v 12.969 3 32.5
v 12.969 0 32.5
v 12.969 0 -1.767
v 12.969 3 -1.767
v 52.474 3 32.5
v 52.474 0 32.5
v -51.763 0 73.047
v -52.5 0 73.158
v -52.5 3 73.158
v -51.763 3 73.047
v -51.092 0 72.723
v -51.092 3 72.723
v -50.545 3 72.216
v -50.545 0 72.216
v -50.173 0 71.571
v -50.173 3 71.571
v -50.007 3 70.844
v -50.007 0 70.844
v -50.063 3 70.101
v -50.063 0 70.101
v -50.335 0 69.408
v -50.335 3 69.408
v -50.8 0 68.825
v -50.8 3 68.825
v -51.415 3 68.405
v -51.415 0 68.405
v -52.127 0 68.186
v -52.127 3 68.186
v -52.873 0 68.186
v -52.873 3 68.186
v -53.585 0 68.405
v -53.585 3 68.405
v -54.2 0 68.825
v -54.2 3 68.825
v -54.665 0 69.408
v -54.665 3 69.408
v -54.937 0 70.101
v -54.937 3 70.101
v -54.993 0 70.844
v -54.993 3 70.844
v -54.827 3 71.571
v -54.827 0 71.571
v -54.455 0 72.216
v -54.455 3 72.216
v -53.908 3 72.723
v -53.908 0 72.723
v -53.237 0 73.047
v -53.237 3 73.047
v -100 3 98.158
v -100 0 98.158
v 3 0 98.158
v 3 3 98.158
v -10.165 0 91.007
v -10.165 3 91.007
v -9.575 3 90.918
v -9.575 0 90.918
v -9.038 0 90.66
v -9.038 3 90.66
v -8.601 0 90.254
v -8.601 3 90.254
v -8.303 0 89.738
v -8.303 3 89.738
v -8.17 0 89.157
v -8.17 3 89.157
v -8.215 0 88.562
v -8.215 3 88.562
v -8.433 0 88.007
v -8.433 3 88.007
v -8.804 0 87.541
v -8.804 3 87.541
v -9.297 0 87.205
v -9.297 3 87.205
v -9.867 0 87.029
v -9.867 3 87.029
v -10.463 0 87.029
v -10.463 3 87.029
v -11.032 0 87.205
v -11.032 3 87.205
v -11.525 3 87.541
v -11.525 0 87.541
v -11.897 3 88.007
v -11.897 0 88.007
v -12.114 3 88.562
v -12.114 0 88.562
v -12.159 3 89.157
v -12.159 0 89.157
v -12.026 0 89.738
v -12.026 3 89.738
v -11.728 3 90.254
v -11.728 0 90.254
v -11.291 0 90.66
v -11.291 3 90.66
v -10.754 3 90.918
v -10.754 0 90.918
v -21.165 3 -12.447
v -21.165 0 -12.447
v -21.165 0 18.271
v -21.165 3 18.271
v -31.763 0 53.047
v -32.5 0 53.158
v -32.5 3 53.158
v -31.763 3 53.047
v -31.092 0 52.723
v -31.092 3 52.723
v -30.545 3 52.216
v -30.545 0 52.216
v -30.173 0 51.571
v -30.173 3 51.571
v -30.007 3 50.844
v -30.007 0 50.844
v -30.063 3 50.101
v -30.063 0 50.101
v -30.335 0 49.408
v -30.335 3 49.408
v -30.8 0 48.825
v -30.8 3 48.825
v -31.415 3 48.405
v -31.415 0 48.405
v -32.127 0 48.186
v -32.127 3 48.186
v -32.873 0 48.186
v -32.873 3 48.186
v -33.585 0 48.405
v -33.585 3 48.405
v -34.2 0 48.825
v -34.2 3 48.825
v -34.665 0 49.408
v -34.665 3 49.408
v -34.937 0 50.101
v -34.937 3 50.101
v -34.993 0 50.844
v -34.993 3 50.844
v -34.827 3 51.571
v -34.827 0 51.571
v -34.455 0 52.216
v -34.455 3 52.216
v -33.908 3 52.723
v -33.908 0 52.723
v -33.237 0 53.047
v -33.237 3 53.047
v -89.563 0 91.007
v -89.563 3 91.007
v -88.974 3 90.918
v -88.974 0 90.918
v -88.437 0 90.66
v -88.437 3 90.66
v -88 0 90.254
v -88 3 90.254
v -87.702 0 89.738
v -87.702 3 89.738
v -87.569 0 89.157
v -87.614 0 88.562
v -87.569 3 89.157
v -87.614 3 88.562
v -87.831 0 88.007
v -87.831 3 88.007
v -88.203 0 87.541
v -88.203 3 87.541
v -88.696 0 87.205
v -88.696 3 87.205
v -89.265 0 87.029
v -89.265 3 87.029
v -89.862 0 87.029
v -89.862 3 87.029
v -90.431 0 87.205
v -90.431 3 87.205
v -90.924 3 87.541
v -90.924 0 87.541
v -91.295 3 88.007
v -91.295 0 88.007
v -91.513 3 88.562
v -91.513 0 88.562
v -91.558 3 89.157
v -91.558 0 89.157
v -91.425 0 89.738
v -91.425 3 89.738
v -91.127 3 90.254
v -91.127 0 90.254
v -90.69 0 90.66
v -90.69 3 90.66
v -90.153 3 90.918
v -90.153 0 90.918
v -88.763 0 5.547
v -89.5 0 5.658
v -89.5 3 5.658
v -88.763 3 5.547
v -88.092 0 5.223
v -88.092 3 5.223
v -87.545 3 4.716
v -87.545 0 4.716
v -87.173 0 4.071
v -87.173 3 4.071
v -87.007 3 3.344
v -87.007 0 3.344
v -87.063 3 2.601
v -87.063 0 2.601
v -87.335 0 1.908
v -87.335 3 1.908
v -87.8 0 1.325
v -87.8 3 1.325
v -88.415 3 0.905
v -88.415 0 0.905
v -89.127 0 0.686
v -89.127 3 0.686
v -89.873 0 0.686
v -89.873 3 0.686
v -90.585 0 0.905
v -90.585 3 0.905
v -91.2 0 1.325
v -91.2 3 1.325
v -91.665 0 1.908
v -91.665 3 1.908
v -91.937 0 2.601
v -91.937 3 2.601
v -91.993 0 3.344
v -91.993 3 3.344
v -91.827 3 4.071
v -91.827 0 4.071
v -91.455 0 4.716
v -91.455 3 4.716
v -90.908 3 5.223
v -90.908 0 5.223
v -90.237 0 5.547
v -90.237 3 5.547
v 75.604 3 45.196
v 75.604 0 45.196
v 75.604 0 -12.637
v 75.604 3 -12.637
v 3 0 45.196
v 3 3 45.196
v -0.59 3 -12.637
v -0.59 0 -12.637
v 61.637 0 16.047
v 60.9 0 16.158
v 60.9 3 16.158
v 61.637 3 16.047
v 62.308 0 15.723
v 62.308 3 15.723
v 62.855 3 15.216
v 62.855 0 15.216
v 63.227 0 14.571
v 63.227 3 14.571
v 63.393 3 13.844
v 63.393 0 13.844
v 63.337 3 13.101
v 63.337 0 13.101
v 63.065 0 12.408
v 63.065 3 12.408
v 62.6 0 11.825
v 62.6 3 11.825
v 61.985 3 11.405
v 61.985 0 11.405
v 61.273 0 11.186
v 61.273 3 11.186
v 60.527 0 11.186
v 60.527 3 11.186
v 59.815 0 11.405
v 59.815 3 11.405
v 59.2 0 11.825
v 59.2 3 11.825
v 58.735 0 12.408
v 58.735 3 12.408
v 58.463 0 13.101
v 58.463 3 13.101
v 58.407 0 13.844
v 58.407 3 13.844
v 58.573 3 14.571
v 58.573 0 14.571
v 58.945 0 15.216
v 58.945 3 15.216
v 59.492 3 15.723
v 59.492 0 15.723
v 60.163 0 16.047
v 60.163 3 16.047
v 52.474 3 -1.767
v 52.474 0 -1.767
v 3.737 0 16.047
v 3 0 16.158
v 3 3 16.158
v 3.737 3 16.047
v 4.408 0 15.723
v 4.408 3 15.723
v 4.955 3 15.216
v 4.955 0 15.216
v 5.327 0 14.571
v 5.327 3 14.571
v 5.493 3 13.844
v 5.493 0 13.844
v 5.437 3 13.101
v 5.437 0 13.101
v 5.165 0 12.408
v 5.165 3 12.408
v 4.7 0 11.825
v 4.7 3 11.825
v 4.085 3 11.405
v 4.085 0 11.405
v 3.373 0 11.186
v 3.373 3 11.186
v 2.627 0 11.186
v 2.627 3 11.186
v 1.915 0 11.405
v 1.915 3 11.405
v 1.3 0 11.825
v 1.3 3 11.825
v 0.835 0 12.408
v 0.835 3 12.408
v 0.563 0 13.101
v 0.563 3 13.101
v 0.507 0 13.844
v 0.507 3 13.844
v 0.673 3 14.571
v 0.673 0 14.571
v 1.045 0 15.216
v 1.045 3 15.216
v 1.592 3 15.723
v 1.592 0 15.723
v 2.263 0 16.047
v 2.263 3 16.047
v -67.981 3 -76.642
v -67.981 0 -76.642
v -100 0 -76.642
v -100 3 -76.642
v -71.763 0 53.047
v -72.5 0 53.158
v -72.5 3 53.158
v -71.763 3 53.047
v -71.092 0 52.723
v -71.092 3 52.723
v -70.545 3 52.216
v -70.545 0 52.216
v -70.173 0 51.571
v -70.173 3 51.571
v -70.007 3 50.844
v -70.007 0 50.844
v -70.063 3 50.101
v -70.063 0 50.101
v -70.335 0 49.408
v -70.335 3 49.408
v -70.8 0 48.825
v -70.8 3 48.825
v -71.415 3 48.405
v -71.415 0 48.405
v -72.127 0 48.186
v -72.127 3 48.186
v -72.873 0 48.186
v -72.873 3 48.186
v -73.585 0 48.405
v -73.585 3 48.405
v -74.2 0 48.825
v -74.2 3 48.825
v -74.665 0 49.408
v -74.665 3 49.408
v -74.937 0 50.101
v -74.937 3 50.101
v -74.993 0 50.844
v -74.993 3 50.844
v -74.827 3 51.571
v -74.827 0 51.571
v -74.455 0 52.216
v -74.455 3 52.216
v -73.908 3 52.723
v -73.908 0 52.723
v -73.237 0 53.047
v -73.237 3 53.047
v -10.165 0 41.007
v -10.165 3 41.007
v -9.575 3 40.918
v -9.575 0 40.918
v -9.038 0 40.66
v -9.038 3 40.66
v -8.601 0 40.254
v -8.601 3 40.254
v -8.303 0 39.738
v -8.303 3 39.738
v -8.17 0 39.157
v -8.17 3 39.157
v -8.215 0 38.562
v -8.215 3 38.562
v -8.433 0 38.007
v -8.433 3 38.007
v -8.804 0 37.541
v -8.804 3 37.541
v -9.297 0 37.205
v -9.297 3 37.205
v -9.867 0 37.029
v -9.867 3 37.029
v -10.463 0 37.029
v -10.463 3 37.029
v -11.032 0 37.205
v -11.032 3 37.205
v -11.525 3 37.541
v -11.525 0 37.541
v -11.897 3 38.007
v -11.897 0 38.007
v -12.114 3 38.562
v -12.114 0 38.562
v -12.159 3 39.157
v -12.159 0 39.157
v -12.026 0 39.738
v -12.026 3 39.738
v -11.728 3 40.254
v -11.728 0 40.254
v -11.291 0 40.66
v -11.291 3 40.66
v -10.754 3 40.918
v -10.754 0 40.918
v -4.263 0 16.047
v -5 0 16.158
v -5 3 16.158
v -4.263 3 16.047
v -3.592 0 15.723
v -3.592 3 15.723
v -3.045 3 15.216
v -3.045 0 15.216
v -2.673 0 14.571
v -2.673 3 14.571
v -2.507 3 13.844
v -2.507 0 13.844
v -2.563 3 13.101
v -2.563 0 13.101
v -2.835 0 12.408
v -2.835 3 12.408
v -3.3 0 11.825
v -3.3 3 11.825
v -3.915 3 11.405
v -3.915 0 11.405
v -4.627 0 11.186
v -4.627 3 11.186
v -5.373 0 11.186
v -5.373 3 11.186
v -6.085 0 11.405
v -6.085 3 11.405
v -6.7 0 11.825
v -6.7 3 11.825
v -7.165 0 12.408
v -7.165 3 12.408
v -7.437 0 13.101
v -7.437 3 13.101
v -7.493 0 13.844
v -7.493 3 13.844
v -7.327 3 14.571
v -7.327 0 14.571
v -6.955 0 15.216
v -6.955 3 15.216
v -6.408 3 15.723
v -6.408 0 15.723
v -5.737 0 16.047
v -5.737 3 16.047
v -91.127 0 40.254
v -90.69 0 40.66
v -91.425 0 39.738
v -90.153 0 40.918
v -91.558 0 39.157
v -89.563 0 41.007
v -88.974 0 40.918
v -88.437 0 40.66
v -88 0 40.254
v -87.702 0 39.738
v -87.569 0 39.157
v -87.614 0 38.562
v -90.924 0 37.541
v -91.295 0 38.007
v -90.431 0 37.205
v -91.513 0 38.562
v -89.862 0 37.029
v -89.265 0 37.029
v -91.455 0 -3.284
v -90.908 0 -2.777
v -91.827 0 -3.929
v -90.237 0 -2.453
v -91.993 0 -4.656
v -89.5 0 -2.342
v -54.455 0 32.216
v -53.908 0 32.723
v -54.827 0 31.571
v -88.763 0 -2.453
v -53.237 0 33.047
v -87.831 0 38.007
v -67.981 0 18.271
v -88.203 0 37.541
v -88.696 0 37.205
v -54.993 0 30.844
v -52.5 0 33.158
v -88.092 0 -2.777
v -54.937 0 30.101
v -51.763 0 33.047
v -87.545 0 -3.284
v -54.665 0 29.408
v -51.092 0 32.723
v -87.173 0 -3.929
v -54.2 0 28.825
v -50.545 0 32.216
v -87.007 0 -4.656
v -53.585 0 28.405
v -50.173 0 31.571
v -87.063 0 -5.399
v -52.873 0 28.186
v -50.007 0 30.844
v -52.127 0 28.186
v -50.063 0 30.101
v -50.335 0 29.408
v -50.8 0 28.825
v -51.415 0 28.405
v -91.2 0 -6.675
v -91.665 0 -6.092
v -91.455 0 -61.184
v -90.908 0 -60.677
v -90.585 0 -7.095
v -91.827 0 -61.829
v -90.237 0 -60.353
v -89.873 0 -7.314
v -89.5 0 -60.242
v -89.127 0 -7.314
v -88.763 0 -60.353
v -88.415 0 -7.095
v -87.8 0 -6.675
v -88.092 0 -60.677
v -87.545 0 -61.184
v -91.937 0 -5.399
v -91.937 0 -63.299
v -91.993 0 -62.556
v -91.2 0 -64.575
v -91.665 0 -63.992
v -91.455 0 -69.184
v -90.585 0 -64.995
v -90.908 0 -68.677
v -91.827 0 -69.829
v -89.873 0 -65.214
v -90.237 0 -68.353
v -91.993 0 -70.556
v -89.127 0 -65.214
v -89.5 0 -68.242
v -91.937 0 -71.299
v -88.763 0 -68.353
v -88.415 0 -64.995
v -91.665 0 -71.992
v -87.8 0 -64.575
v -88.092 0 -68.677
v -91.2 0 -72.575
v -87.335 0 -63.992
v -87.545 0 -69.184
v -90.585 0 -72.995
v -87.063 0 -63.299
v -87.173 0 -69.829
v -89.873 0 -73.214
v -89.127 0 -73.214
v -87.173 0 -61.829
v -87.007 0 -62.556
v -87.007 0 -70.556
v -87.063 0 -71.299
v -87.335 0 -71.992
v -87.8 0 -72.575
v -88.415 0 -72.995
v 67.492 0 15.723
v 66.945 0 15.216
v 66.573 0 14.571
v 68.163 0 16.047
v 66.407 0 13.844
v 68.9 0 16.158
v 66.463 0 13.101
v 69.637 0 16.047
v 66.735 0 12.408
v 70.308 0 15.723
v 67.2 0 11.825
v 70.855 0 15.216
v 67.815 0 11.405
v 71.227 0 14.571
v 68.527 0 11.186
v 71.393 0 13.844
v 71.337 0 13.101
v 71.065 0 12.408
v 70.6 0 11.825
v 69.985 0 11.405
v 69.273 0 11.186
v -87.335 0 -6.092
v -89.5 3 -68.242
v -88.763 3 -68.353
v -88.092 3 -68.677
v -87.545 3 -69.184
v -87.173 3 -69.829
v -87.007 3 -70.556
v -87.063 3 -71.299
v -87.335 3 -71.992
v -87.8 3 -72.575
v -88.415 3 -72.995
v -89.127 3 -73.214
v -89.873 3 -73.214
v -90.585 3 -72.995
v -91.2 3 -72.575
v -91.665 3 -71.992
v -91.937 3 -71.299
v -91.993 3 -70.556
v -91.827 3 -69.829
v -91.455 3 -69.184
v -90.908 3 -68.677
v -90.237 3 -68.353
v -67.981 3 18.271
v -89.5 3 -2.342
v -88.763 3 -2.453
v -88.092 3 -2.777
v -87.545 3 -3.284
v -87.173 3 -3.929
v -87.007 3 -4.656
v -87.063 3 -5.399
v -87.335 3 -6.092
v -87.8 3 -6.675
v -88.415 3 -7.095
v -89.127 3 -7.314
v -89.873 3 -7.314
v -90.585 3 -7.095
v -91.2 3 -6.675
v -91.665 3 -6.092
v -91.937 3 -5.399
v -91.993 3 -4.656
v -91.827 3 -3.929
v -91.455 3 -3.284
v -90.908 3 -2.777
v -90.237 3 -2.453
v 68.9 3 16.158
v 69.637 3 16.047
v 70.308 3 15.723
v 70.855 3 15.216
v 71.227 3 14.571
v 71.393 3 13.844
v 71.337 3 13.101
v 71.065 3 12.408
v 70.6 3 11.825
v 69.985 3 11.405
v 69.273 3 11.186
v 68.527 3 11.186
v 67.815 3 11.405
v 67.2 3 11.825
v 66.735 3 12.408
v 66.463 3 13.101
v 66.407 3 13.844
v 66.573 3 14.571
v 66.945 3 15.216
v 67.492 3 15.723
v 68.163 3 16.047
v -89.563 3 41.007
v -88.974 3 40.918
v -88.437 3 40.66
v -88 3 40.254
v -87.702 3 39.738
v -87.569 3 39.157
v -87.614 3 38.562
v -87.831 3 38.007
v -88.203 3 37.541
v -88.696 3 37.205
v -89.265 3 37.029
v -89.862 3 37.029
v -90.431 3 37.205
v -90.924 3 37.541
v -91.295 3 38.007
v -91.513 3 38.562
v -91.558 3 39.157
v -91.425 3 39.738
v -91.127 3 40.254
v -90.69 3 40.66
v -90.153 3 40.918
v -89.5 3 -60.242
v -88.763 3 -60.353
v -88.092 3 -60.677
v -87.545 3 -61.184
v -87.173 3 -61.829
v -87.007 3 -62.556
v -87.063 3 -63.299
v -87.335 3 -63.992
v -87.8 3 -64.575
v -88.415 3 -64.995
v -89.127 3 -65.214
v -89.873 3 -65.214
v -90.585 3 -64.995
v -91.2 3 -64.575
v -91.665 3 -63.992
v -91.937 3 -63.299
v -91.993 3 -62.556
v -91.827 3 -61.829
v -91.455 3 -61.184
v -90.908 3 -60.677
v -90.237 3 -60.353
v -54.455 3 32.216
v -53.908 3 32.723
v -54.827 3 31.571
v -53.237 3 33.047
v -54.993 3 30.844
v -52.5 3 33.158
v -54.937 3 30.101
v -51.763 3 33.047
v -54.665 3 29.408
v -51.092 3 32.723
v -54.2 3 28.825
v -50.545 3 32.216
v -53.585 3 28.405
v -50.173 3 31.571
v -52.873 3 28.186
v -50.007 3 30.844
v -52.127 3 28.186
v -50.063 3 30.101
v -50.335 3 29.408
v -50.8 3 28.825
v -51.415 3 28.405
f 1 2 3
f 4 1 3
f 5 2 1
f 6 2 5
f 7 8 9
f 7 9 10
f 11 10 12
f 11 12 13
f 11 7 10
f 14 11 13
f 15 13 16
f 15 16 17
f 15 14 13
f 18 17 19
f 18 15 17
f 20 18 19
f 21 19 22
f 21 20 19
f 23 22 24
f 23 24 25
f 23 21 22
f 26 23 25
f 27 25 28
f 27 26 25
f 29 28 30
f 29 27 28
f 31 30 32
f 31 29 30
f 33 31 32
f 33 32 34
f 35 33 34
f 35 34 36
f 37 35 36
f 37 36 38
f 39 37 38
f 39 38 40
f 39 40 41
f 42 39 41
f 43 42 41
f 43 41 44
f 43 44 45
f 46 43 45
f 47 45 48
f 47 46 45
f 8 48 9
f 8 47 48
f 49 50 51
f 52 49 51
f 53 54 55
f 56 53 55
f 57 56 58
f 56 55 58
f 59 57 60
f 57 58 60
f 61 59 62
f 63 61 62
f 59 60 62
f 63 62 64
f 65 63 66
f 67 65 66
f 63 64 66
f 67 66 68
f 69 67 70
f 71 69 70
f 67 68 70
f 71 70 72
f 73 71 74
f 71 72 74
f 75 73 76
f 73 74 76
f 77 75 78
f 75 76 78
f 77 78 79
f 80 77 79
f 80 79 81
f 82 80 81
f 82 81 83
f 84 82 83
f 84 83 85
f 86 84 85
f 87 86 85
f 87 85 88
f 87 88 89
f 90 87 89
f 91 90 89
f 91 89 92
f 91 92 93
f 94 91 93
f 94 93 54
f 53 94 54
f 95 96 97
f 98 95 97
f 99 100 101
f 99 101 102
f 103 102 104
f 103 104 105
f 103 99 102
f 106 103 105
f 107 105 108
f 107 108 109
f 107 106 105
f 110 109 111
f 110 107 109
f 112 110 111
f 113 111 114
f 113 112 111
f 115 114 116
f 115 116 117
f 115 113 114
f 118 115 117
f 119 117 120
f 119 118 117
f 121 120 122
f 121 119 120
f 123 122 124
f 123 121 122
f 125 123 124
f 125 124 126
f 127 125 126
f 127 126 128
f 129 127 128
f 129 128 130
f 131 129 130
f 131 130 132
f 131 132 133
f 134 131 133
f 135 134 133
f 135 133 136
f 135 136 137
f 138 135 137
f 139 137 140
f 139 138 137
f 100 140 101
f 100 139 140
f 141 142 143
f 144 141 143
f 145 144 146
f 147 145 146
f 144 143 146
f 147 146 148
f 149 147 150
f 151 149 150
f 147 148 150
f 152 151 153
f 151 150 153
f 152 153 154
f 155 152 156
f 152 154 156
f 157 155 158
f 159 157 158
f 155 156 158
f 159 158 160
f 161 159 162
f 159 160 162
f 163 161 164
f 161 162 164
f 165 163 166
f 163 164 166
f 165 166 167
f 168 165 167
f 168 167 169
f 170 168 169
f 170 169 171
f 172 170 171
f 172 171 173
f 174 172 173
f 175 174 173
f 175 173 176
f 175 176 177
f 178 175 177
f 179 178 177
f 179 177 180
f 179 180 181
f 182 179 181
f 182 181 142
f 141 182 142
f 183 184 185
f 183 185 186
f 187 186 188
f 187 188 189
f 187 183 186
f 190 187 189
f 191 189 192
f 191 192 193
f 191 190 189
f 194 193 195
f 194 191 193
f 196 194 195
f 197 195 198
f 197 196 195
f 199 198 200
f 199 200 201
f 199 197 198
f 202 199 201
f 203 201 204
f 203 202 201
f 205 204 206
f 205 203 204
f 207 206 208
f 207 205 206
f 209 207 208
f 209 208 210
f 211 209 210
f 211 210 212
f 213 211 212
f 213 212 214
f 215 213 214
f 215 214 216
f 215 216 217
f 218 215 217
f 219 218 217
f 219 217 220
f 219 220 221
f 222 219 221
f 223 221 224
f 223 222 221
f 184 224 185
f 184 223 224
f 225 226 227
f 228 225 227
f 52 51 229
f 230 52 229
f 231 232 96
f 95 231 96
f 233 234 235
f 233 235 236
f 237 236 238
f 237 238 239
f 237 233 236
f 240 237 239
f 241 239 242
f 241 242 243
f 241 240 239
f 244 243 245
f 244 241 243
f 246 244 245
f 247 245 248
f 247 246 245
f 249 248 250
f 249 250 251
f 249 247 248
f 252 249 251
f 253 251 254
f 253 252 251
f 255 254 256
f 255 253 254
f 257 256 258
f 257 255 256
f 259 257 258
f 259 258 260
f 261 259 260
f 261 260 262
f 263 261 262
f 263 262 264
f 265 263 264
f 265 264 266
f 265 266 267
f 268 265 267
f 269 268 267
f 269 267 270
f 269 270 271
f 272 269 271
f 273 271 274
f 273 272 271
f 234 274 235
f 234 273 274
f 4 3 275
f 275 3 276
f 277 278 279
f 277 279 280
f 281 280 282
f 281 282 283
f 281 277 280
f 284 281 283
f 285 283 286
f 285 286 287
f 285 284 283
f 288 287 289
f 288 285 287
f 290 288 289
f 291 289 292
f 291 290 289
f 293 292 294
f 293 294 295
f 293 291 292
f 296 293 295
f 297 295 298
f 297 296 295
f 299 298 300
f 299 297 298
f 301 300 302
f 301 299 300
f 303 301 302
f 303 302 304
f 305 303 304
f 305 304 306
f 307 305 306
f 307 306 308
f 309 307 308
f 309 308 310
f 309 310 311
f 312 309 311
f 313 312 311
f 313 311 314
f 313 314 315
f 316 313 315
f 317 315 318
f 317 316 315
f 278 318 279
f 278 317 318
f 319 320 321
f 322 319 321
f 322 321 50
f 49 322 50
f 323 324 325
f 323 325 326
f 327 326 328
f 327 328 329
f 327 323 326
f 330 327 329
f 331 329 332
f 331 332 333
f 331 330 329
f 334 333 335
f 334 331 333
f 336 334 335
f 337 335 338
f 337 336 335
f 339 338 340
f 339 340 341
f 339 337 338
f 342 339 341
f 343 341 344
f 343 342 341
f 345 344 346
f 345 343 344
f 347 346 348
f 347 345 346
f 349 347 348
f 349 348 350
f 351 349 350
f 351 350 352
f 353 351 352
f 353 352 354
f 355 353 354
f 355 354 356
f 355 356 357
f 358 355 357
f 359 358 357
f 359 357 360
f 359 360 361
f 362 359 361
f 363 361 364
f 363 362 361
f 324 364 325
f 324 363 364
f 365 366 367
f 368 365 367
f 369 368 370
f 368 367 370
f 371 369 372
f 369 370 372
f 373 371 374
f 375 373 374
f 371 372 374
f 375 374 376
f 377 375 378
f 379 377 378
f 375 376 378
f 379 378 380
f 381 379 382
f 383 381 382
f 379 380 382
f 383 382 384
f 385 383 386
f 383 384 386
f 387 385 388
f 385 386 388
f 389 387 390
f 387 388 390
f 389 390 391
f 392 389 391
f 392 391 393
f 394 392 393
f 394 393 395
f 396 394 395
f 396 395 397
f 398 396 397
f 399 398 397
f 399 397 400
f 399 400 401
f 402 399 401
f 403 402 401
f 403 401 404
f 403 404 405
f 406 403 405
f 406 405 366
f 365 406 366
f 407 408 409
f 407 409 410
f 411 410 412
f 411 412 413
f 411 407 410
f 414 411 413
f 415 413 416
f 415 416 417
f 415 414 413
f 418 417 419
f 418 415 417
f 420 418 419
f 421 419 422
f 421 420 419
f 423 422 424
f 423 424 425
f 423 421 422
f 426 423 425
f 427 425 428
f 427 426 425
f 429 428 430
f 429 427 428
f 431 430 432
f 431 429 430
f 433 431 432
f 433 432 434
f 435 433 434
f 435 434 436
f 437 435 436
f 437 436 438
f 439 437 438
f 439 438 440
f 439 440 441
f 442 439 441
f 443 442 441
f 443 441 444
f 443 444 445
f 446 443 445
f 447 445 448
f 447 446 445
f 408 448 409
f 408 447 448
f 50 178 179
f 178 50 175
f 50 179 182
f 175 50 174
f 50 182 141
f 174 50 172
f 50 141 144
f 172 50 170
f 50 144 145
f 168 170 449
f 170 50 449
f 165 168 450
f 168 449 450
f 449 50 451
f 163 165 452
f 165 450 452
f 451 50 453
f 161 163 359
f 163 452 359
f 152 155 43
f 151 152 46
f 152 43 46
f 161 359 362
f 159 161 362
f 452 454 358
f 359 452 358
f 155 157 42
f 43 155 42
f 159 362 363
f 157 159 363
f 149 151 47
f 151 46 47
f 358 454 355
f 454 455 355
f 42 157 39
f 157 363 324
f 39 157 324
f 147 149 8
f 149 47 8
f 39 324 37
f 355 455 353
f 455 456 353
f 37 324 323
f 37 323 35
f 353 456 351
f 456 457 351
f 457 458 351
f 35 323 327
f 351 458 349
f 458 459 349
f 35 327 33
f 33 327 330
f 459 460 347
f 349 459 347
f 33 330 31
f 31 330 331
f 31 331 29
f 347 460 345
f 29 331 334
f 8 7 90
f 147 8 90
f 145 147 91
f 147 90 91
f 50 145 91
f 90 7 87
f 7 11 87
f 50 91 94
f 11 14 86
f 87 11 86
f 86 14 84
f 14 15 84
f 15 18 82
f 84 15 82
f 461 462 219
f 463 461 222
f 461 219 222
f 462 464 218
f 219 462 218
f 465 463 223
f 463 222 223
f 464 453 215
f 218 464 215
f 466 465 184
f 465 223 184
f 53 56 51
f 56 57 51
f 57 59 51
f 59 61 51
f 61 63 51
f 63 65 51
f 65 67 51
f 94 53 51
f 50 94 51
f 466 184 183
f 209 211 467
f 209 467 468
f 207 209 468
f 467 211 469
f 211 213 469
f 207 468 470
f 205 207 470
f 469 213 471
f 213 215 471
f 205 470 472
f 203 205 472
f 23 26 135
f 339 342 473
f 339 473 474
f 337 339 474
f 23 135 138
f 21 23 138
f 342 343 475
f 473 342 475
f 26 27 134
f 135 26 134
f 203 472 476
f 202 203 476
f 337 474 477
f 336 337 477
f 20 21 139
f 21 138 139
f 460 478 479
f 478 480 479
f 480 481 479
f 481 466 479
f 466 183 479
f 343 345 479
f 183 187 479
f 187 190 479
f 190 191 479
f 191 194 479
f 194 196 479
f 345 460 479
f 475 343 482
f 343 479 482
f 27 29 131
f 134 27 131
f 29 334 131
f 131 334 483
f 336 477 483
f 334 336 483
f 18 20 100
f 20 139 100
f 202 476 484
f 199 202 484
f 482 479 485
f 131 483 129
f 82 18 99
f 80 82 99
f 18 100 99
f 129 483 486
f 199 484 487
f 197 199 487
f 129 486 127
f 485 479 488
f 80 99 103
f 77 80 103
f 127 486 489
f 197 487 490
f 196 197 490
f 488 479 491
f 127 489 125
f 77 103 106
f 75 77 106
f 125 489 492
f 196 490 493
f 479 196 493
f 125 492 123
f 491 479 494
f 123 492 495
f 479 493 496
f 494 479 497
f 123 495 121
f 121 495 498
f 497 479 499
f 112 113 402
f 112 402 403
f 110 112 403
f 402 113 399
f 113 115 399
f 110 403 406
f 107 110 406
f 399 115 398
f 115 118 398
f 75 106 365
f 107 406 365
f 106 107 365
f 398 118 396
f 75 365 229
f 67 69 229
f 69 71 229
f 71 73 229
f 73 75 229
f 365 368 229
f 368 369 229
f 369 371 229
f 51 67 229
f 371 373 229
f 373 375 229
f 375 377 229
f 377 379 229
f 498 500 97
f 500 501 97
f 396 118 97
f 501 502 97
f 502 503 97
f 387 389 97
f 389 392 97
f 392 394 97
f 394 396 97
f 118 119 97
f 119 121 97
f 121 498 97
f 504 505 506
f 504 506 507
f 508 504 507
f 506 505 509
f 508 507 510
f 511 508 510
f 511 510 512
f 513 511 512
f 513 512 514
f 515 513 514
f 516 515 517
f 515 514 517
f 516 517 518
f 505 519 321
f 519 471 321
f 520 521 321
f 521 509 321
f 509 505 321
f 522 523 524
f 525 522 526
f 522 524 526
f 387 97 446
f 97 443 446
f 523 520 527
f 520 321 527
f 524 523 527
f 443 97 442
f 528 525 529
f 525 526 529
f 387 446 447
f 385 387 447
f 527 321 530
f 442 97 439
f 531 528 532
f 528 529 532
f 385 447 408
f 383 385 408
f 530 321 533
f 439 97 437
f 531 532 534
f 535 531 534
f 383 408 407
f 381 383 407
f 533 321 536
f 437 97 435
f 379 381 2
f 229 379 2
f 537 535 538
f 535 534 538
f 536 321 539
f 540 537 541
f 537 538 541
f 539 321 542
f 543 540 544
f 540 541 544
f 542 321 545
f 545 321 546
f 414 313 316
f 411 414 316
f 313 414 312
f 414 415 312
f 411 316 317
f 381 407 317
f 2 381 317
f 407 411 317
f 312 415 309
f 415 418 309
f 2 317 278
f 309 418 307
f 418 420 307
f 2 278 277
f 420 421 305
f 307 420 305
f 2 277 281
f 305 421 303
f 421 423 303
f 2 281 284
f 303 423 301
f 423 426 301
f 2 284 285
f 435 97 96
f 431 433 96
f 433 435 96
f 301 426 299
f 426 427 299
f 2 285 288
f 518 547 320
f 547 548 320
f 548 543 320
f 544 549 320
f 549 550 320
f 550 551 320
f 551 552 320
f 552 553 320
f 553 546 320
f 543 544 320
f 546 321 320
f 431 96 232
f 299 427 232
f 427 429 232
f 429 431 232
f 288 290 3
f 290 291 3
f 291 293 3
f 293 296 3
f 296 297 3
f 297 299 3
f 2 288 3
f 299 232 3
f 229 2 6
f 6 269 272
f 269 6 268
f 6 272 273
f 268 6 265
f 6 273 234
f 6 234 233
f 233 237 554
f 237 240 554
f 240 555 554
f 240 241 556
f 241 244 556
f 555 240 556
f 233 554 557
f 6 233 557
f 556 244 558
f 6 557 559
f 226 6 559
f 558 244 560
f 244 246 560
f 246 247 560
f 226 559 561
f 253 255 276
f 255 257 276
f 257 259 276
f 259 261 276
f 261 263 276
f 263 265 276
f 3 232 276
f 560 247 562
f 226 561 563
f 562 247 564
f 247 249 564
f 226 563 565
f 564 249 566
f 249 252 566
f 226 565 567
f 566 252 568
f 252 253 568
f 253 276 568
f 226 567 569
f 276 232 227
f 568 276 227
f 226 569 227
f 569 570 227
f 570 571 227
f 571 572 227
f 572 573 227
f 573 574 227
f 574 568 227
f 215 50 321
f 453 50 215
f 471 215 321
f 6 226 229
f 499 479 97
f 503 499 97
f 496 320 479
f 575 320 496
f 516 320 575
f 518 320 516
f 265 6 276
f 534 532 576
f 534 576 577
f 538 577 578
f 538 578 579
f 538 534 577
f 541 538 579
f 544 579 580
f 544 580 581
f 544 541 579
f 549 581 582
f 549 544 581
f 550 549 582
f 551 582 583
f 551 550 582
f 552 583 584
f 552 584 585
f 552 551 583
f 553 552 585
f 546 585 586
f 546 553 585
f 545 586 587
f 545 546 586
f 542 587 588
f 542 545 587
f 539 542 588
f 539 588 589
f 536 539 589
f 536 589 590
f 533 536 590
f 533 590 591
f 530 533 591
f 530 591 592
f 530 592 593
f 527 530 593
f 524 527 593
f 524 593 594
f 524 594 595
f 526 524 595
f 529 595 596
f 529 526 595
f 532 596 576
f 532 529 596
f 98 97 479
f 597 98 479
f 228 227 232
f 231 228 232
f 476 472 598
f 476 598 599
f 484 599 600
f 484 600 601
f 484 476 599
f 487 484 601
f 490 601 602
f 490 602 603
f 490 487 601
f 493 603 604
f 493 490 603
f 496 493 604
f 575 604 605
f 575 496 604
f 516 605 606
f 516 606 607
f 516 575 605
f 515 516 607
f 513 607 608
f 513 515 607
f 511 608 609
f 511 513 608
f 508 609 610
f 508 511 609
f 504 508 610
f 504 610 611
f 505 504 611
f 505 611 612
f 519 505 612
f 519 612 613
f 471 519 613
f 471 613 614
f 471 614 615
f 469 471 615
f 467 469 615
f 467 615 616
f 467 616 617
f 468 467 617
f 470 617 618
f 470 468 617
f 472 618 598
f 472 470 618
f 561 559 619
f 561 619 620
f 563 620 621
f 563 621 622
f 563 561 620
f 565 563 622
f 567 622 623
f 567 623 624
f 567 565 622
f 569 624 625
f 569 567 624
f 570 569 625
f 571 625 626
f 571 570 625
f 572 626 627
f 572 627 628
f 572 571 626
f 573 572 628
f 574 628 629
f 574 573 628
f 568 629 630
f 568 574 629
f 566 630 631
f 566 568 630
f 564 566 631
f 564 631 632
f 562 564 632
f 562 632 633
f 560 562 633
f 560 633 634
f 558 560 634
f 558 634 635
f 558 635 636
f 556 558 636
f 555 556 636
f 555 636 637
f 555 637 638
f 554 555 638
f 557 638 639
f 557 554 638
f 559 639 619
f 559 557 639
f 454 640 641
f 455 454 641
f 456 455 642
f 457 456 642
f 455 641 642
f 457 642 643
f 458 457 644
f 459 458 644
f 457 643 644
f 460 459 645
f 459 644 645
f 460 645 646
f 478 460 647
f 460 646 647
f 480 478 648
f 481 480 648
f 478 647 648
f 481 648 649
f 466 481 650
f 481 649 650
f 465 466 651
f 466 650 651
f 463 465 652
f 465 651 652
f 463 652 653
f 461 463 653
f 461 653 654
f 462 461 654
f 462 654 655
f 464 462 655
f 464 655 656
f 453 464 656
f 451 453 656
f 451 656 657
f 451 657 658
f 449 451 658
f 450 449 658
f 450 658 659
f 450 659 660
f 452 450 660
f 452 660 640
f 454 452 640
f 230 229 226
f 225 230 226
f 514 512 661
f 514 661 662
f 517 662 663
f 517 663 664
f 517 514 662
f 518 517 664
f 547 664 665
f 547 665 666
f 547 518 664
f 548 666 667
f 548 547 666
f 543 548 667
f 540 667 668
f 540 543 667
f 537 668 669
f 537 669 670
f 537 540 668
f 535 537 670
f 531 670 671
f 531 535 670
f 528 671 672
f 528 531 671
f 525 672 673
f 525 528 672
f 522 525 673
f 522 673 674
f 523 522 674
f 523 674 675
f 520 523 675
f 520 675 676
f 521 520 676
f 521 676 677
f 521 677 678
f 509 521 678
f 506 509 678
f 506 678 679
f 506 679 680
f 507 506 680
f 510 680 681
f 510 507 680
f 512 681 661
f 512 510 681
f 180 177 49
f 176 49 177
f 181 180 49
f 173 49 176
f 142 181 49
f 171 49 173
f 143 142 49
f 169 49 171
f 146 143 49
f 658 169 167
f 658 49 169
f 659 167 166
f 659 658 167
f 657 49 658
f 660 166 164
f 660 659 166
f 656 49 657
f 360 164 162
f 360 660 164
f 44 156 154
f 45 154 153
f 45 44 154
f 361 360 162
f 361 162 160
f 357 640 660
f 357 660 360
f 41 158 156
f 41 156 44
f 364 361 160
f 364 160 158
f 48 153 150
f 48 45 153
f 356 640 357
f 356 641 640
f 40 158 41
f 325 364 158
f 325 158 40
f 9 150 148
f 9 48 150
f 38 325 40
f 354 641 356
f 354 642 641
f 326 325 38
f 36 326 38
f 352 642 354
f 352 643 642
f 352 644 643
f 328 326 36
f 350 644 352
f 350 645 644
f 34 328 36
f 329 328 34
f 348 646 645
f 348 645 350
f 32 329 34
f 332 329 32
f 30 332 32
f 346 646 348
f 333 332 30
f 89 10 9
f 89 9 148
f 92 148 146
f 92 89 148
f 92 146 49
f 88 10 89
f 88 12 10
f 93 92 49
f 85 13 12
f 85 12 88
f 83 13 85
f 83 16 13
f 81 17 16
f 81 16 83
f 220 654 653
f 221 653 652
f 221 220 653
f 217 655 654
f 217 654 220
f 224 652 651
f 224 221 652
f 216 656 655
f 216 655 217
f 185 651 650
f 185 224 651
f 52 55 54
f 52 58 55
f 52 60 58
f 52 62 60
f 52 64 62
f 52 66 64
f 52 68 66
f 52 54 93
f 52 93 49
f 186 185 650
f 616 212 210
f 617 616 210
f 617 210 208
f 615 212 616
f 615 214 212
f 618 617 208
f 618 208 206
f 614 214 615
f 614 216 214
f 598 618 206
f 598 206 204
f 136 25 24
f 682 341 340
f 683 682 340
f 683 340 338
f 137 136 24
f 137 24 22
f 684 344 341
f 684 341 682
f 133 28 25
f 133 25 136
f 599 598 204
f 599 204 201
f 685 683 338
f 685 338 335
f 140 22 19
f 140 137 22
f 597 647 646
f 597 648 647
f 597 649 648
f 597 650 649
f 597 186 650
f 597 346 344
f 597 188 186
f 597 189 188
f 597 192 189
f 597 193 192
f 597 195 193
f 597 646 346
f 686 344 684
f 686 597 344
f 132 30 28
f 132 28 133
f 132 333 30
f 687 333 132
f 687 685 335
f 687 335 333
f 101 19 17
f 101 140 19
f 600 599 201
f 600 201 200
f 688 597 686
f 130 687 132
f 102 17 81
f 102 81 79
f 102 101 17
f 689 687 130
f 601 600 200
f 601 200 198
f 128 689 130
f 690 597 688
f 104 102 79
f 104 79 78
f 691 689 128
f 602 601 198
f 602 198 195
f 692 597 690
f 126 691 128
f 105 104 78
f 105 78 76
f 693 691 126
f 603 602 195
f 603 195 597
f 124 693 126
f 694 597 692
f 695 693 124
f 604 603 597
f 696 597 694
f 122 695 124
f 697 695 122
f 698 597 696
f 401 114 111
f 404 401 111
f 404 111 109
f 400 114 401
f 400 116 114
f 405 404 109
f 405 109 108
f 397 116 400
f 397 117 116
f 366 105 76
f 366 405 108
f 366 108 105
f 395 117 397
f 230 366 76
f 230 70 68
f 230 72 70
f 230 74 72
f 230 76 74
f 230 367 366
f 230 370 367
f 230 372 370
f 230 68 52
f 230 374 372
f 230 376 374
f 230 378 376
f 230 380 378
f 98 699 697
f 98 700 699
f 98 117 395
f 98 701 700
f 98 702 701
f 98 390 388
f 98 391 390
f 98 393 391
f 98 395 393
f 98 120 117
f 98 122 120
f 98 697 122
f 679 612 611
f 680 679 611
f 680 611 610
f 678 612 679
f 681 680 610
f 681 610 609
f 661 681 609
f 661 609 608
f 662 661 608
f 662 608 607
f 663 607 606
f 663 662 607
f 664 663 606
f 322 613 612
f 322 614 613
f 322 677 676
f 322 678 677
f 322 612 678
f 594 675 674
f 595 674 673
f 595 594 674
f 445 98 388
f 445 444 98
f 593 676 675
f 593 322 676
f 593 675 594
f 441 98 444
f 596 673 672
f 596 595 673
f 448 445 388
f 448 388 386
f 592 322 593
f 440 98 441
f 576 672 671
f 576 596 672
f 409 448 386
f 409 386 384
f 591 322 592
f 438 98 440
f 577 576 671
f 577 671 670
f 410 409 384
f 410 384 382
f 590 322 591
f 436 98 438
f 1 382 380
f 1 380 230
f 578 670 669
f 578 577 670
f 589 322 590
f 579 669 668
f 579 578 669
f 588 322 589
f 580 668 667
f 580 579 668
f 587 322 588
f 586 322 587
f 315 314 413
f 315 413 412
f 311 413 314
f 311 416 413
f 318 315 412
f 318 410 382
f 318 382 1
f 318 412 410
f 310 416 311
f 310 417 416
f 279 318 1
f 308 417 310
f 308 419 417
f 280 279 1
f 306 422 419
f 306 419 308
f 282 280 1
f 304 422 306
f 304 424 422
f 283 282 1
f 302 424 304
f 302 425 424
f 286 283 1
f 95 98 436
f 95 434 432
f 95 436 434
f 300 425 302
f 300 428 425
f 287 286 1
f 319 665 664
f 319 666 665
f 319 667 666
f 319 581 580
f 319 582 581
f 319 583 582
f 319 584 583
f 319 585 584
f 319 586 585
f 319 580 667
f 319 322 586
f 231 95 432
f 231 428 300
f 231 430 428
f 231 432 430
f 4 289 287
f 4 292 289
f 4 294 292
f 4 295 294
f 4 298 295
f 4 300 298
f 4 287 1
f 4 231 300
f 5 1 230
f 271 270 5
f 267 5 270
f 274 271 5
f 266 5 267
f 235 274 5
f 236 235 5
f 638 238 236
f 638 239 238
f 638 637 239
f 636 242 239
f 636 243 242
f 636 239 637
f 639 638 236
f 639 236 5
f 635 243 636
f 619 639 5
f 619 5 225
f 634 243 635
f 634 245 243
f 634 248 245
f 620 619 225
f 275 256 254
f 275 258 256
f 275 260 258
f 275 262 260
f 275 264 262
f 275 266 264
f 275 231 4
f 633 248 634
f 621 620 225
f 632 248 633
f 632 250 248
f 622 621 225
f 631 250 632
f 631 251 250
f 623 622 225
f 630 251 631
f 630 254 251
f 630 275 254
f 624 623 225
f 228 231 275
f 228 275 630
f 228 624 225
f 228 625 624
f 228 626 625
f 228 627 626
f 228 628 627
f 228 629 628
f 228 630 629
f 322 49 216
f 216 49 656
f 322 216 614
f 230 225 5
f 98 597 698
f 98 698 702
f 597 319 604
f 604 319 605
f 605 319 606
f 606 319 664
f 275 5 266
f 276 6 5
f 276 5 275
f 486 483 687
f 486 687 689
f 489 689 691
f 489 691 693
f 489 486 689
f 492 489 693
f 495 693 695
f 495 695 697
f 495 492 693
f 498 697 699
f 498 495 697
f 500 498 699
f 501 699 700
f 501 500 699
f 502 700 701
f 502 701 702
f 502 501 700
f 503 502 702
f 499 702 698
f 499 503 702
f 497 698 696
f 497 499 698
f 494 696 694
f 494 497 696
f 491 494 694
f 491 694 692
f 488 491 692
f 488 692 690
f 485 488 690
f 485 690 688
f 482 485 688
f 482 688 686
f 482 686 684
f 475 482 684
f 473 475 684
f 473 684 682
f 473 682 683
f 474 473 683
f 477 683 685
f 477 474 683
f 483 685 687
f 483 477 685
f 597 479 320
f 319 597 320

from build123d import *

# Parameters (mm, degrees)
SKETCH1_R           = 2.5
SKETCH1_W           = 39.504270757
SKETCH1_H           = 34.26660973
BOSS_EXTRUDE1_DEPTH = 3
SKETCH4_R           = 2
CUT_EXTRUDE3_DEPTH  = 10


with BuildPart() as part:
    # Sketch1 → Boss-Extrude1 (new body)
    with BuildSketch(Plane(origin=(0, 0, 0), x_dir=(1, 0, 0), z_dir=(0, 1, 0))):
        Polygon((-100, 76.642236505), (-100, -98.157625791), (3, -98.157625791), (3, -45.195936932), (75.604056887, -45.195936932), (75.604056887, 12.636866249), (-0.5895682, 12.636866249), (-21.164811555, 12.447038184), (-21.164811555, -18.271243478), (-67.980697631, -18.271243478), (-67.980697631, 12.636866249), (-67.980697631, 76.642236505), align=None)
        with Locations(Location((-52.5, -70.657625791, 0), (0, 0, 270))):
            Circle(SKETCH1_R, mode=Mode.SUBTRACT)
        with Locations(Location((-72.5, -50.657625791, 0), (0, 0, 270))):
            Circle(SKETCH1_R, mode=Mode.SUBTRACT)
        with Locations(Location((-52.5, -30.657625791, 0), (0, 0, 270))):
            Circle(SKETCH1_R, mode=Mode.SUBTRACT)
        with Locations(Location((-32.5, -50.657625791, 0), (0, 0, 270))):
            Circle(SKETCH1_R, mode=Mode.SUBTRACT)
        with Locations(Location((-5, -13.657625791, 0), (0, 0, 270))):
            Circle(SKETCH1_R, mode=Mode.SUBTRACT)
        with Locations(Location((60.9, -13.657625791, 0), (0, 0, 270))):
            Circle(SKETCH1_R, mode=Mode.SUBTRACT)
        with Locations(Location((-89.5, -3.157625791, 0), (0, 0, 270))):
            Circle(SKETCH1_R, mode=Mode.SUBTRACT)
        with Locations(Location((-89.5, 62.742374209, 0), (0, 0, 270))):
            Circle(SKETCH1_R, mode=Mode.SUBTRACT)
        with Locations(Location((-89.5, 4.842374209, 0), (0, 0, 270))):
            Circle(SKETCH1_R, mode=Mode.SUBTRACT)
        with Locations(Location((-89.5, 70.742374209, 0), (0, 0, 270))):
            Circle(SKETCH1_R, mode=Mode.SUBTRACT)
        with Locations(Location((3, -13.657625791, 0), (0, 0, 270))):
            Circle(SKETCH1_R, mode=Mode.SUBTRACT)
        with Locations(Location((68.9, -13.657625791, 0), (0, 0, 270))):
            Circle(SKETCH1_R, mode=Mode.SUBTRACT)
        with Locations((32.721465803, -15.366695135)):
            Rectangle(SKETCH1_W, SKETCH1_H, mode=Mode.SUBTRACT)
    extrude(amount=BOSS_EXTRUDE1_DEPTH)

    # Sketch4 → Cut-Extrude3 (cut)
    with BuildSketch(Plane(origin=(0, 3, 0), x_dir=(1, 0, 0), z_dir=(0, 1, 0))):
        with Locations((-63.221437818, -7.837794837)):
            Circle(SKETCH4_R)
        with Locations((-26.595771041, -7.837794837)):
            Circle(SKETCH4_R)
        with Locations(Location((-89.563443469, -89.007054179, 0), (0, 0, 270))):
            Circle(SKETCH4_R)
        with Locations(Location((-10.164633565, -89.007054179, 0), (0, 0, 270))):
            Circle(SKETCH4_R)
        with Locations(Location((-10.164633565, -39.007054179, 0), (0, 0, 270))):
            Circle(SKETCH4_R)
        with Locations(Location((-89.563443469, -39.007054179, 0), (0, 0, 270))):
            Circle(SKETCH4_R)
    extrude(amount=-CUT_EXTRUDE3_DEPTH, mode=Mode.SUBTRACT)


solid = part.part
